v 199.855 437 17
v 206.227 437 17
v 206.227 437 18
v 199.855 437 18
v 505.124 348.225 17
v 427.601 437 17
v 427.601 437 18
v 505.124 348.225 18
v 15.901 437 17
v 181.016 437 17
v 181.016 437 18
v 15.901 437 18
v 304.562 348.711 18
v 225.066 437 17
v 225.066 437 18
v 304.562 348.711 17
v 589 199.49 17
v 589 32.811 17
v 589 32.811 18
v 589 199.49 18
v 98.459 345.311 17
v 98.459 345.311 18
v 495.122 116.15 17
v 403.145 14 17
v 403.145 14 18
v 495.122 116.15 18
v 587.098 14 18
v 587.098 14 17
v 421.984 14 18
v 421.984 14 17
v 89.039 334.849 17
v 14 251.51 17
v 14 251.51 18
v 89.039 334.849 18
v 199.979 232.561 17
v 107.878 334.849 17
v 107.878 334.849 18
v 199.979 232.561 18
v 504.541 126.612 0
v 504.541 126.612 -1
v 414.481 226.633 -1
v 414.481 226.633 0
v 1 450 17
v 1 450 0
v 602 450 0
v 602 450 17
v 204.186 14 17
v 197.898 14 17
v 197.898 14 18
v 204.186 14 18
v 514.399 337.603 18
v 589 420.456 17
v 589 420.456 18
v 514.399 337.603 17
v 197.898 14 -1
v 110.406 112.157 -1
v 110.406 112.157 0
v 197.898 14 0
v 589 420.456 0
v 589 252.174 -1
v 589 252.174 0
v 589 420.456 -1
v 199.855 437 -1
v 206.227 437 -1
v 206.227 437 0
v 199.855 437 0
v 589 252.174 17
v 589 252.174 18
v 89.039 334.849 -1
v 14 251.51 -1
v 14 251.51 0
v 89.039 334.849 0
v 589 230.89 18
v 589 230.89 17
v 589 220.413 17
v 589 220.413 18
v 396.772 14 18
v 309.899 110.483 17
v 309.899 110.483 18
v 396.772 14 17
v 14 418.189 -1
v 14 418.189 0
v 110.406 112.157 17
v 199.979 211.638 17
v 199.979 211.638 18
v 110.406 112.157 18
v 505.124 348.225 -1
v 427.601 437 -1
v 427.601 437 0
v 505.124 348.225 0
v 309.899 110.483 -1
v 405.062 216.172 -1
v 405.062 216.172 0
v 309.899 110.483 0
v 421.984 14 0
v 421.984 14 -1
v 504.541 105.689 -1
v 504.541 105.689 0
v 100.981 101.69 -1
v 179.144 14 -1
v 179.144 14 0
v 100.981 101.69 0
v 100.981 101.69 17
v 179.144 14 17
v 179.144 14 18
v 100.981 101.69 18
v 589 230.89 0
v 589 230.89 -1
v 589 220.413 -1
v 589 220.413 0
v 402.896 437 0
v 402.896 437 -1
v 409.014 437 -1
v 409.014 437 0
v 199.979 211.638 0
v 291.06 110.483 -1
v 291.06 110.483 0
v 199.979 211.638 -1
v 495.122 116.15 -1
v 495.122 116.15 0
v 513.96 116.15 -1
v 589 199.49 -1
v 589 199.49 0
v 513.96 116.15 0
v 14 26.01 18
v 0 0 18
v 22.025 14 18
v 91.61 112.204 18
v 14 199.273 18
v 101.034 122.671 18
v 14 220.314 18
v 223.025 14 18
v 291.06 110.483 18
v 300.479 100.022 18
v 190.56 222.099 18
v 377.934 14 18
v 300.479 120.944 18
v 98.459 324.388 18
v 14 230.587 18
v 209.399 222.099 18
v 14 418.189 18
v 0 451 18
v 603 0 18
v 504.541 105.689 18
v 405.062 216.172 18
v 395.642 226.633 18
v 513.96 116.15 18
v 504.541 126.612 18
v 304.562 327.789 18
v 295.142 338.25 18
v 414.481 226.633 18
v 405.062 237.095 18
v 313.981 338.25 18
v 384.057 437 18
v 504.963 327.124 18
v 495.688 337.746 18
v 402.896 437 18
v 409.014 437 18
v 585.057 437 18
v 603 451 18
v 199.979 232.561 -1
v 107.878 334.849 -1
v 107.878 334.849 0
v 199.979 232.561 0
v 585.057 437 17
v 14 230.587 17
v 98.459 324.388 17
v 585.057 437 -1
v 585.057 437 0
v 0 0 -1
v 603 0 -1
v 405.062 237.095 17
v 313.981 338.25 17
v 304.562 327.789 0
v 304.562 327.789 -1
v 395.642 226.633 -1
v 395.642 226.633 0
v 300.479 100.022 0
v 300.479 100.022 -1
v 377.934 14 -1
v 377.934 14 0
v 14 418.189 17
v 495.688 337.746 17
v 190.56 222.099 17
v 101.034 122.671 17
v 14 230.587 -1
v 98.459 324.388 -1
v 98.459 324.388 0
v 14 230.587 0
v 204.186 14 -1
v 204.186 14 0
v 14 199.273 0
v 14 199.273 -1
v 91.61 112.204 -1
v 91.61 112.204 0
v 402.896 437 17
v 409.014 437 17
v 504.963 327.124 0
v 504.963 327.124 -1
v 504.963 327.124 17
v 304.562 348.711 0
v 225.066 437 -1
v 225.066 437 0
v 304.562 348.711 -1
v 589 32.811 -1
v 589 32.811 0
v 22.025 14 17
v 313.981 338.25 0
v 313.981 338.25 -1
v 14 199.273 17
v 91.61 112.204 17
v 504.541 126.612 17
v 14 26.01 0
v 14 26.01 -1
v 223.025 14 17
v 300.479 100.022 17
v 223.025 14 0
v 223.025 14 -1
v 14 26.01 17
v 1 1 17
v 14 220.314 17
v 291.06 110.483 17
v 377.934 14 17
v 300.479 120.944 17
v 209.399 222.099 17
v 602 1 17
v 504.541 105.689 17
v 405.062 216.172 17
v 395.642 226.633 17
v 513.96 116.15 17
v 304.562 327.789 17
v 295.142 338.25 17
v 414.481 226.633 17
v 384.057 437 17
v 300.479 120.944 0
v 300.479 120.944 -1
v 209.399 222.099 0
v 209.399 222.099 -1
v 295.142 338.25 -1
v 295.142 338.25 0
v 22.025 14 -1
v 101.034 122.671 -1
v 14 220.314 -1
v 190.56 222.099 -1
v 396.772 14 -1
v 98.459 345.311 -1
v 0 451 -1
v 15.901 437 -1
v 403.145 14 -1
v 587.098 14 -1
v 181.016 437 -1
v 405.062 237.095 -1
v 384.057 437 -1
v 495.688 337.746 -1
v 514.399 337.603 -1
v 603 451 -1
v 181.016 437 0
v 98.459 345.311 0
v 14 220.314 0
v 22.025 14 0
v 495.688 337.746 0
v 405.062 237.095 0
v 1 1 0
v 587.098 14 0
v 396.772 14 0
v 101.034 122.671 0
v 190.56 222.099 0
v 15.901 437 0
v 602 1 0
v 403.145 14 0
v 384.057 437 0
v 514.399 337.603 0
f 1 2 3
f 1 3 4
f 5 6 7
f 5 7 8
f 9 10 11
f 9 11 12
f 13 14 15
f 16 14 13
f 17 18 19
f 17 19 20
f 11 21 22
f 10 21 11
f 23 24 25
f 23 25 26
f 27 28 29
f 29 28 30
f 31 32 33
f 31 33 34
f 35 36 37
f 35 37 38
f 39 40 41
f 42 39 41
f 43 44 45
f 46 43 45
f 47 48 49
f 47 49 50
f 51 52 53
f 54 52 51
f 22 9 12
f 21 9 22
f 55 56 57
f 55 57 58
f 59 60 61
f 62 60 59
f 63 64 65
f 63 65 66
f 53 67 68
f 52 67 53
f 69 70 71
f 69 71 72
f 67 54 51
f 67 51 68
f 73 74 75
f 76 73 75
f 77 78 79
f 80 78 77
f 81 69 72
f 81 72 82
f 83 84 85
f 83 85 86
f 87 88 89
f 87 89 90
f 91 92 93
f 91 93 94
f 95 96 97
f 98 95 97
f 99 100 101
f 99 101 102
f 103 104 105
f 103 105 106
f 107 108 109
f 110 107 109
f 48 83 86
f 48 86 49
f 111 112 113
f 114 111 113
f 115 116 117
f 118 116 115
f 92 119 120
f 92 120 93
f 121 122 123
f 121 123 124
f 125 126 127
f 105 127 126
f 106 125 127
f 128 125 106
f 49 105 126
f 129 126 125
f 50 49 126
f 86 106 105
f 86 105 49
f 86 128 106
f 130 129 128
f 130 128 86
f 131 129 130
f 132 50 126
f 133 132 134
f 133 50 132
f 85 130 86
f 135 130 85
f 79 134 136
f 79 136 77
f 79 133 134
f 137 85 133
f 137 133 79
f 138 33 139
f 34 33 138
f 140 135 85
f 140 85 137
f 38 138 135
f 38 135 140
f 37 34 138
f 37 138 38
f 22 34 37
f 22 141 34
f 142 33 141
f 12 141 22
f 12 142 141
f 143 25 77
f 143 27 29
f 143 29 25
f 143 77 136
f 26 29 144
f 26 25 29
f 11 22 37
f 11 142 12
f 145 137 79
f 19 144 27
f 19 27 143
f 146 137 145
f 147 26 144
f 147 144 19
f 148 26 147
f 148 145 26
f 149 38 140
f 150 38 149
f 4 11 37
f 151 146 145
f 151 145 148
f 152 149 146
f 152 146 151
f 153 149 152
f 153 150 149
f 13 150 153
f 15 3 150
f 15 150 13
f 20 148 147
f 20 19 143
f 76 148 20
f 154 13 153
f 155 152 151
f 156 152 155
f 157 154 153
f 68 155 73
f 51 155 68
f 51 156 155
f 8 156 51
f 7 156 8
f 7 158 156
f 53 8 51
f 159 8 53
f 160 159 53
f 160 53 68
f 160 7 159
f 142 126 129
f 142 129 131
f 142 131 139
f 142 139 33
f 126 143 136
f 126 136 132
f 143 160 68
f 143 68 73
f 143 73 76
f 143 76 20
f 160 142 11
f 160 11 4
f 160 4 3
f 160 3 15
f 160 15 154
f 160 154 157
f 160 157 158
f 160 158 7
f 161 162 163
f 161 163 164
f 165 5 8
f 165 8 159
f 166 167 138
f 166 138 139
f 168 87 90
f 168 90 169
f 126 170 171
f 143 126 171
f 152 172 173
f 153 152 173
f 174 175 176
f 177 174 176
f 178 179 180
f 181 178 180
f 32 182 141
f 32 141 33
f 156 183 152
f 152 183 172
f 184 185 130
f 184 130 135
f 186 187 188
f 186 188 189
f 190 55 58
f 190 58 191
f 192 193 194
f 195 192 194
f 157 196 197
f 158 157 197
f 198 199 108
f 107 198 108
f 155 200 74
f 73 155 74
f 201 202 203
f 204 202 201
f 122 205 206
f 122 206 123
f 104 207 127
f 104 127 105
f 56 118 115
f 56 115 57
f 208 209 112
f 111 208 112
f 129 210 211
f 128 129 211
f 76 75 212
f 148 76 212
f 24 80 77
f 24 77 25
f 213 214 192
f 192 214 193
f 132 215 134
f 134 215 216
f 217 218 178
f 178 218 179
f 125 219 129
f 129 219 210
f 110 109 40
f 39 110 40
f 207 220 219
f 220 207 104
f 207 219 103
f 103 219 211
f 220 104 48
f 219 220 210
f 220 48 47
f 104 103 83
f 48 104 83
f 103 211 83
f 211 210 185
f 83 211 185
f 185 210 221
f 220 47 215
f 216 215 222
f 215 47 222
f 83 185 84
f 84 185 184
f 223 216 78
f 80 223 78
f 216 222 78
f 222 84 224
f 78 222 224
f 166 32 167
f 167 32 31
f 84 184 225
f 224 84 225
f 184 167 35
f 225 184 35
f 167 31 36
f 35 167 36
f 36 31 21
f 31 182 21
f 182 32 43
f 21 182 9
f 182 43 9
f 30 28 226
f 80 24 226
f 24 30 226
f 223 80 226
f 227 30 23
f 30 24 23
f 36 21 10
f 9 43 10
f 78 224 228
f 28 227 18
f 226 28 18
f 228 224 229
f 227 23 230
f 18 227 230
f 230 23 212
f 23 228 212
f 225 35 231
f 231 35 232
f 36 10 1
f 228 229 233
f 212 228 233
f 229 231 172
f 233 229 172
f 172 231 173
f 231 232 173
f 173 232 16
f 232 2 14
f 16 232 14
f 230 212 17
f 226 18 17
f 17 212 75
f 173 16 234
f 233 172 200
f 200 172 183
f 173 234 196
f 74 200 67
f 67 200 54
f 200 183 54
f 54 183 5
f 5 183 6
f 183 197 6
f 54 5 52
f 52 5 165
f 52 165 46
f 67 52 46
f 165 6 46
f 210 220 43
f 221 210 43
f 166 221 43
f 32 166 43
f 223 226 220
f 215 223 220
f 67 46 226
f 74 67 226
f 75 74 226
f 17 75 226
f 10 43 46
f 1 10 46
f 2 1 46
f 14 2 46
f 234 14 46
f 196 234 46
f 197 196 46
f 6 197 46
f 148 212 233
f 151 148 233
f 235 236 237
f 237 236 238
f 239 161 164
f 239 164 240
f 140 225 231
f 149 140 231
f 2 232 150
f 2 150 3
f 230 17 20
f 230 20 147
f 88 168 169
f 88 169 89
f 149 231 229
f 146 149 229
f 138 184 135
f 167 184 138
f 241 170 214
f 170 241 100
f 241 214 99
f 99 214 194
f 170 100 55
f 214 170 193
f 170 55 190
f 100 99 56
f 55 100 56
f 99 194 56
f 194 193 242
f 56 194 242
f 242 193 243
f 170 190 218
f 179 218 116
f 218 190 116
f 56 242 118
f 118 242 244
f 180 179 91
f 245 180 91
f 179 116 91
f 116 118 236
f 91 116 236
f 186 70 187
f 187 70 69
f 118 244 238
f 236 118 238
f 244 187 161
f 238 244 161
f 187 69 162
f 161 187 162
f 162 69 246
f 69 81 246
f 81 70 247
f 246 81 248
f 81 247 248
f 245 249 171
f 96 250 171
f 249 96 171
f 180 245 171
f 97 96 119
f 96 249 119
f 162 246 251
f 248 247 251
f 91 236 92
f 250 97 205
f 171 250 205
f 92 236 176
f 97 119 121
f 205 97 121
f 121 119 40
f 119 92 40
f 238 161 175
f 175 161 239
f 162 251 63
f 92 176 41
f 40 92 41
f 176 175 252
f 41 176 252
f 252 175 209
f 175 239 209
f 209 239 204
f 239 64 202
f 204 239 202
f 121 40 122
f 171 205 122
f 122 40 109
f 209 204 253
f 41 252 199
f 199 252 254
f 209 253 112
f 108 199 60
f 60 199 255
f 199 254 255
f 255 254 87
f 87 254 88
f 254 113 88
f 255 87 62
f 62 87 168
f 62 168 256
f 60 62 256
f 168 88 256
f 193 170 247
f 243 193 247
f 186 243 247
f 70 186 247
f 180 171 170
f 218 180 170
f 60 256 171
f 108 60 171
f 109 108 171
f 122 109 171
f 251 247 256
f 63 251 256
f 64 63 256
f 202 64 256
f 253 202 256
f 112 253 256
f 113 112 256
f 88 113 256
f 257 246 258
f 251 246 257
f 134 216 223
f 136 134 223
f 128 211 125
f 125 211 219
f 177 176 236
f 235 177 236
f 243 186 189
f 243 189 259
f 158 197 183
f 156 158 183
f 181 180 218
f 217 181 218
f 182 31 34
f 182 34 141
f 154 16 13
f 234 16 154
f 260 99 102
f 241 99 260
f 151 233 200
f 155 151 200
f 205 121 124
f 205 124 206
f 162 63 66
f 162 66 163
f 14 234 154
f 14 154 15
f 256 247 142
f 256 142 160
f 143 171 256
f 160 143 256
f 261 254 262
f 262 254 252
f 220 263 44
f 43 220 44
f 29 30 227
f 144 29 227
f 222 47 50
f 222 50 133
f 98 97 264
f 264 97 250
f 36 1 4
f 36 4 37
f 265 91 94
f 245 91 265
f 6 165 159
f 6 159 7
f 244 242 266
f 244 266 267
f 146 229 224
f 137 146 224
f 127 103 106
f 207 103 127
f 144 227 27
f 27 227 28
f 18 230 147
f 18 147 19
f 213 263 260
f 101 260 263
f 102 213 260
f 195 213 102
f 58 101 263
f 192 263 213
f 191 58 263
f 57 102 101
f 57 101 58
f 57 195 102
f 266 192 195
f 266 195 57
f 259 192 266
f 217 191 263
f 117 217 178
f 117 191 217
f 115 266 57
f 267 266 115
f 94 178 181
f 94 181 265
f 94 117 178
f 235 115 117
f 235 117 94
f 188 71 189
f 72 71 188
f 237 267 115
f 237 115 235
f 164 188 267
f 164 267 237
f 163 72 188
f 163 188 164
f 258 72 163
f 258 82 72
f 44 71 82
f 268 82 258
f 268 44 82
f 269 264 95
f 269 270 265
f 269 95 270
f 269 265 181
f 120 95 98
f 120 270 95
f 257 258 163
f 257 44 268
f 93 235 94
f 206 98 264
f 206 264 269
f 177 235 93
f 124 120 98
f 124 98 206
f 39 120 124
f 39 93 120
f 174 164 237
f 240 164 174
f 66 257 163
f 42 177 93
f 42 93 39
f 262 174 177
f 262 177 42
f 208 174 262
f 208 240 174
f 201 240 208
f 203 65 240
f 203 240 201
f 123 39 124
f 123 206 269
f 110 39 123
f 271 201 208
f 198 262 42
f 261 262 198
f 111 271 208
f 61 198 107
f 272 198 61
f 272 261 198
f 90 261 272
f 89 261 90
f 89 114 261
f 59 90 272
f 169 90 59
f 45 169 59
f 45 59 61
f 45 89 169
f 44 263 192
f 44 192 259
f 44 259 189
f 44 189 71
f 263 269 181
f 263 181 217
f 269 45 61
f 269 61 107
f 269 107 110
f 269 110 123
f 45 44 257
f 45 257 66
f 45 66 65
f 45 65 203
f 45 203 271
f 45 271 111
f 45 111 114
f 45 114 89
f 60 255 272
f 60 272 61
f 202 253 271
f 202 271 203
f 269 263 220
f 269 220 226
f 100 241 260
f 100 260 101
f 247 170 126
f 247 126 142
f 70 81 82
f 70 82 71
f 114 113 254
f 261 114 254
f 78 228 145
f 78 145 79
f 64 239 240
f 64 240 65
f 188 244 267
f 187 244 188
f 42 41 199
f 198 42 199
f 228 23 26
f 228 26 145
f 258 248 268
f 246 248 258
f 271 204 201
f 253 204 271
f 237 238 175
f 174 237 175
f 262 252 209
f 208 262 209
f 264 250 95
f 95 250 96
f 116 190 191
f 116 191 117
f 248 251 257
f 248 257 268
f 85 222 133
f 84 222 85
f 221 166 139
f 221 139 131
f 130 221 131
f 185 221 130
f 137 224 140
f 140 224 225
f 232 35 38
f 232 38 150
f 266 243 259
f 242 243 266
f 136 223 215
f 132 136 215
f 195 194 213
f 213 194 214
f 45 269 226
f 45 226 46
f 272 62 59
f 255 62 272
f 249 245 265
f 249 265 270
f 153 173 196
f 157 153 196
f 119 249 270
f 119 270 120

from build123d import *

# Parameters (mm, degrees)
SKETCH_W            = 603
SKETCH_H            = 451
SKETCH_W_2          = 601
SKETCH_H_2          = 449
PAD_DEPTH           = 17
SKETCH001_W         = 603
SKETCH001_H         = 451
PAD001_DEPTH        = 1
LINEARPATTERN_COUNT = 2
LINEARPATTERN_PITCH = 18


with BuildPart() as part:
    # Sketch → Pad (new body)
    with BuildSketch(Plane.XY):
        with Locations((301.5, 225.5)):
            Rectangle(SKETCH_W, SKETCH_H)
        with Locations((301.5, 225.5)):
            Rectangle(SKETCH_W_2, SKETCH_H_2, mode=Mode.SUBTRACT)
    extrude(amount=PAD_DEPTH)

    # Sketch001 (on Face10 of Pad) → Pad001 (join)
    with BuildSketch(Plane.XY.offset(17)):
        with Locations((301.5, 225.5)):
            Rectangle(SKETCH001_W, SKETCH001_H)
        Polygon((22.025087, 14), (179.143913, 14), (100.981365, 101.689824), align=None, mode=Mode.SUBTRACT)
        Polygon((589, 32.810618), (589, 199.49019), (513.960487, 116.150433), align=None, mode=Mode.SUBTRACT)
        Polygon((585.05717, 437), (427.601062, 437), (505.123787, 348.224991), align=None, mode=Mode.SUBTRACT)
        Polygon((14, 418.188846), (14, 251.509909), (89.039227, 334.849407), align=None, mode=Mode.SUBTRACT)
        Polygon((15.901213, 437), (98.458656, 345.310742), (181.016042, 437), align=None, mode=Mode.SUBTRACT)
        Polygon((225.066216, 437), (304.561693, 348.711335), (384.05717, 437), align=None, mode=Mode.SUBTRACT)
        Polygon((199.854901, 437), (107.878089, 334.84941), (199.979256, 232.560781), (295.142264, 338.25), (206.227357, 437), align=None, mode=Mode.SUBTRACT)
        Polygon((409.014436, 437), (495.688193, 337.745703), (405.061693, 237.094787), (313.981123, 338.25), (402.896029, 437), align=None, mode=Mode.SUBTRACT)
        Polygon((589, 220.412852), (504.541058, 126.611768), (414.481123, 226.633451), (504.96341, 327.124204), (589, 230.889854), align=None, mode=Mode.SUBTRACT)
        Polygon((421.983753, 14), (504.541055, 105.689101), (587.098299, 14), align=None, mode=Mode.SUBTRACT)
        Polygon((223.025087, 14), (300.479294, 100.021605), (377.933555, 14), align=None, mode=Mode.SUBTRACT)
        Polygon((197.898215, 14), (204.186228, 14), (291.059861, 110.482936), (199.979259, 211.638114), (110.405888, 112.156815), align=None, mode=Mode.SUBTRACT)
        Polygon((396.77242, 14), (403.144888, 14), (495.121626, 116.150436), (405.061693, 216.172116), (309.898723, 110.48294), align=None, mode=Mode.SUBTRACT)
        Polygon((14, 220.313669), (101.034043, 122.670999), (190.559826, 222.099446), (98.458659, 324.388075), (14, 230.587239), align=None, mode=Mode.SUBTRACT)
        Polygon((14, 199.273395), (91.609521, 112.204007), (14, 26.009909), align=None, mode=Mode.SUBTRACT)
        Polygon((304.561693, 327.788665), (395.642264, 226.633451), (300.479291, 120.944271), (209.398688, 222.099449), align=None, mode=Mode.SUBTRACT)
        Polygon((514.399004, 337.603492), (589, 252.174295), (589, 420.456285), align=None, mode=Mode.SUBTRACT)
    pad001 = extrude(amount=PAD001_DEPTH)

    # LinearPattern: Pad001 ×2
    with Locations(*[(0, 0, -i * LINEARPATTERN_PITCH) for i in range(1, LINEARPATTERN_COUNT)]):
        add(pad001)


solid = part.part
